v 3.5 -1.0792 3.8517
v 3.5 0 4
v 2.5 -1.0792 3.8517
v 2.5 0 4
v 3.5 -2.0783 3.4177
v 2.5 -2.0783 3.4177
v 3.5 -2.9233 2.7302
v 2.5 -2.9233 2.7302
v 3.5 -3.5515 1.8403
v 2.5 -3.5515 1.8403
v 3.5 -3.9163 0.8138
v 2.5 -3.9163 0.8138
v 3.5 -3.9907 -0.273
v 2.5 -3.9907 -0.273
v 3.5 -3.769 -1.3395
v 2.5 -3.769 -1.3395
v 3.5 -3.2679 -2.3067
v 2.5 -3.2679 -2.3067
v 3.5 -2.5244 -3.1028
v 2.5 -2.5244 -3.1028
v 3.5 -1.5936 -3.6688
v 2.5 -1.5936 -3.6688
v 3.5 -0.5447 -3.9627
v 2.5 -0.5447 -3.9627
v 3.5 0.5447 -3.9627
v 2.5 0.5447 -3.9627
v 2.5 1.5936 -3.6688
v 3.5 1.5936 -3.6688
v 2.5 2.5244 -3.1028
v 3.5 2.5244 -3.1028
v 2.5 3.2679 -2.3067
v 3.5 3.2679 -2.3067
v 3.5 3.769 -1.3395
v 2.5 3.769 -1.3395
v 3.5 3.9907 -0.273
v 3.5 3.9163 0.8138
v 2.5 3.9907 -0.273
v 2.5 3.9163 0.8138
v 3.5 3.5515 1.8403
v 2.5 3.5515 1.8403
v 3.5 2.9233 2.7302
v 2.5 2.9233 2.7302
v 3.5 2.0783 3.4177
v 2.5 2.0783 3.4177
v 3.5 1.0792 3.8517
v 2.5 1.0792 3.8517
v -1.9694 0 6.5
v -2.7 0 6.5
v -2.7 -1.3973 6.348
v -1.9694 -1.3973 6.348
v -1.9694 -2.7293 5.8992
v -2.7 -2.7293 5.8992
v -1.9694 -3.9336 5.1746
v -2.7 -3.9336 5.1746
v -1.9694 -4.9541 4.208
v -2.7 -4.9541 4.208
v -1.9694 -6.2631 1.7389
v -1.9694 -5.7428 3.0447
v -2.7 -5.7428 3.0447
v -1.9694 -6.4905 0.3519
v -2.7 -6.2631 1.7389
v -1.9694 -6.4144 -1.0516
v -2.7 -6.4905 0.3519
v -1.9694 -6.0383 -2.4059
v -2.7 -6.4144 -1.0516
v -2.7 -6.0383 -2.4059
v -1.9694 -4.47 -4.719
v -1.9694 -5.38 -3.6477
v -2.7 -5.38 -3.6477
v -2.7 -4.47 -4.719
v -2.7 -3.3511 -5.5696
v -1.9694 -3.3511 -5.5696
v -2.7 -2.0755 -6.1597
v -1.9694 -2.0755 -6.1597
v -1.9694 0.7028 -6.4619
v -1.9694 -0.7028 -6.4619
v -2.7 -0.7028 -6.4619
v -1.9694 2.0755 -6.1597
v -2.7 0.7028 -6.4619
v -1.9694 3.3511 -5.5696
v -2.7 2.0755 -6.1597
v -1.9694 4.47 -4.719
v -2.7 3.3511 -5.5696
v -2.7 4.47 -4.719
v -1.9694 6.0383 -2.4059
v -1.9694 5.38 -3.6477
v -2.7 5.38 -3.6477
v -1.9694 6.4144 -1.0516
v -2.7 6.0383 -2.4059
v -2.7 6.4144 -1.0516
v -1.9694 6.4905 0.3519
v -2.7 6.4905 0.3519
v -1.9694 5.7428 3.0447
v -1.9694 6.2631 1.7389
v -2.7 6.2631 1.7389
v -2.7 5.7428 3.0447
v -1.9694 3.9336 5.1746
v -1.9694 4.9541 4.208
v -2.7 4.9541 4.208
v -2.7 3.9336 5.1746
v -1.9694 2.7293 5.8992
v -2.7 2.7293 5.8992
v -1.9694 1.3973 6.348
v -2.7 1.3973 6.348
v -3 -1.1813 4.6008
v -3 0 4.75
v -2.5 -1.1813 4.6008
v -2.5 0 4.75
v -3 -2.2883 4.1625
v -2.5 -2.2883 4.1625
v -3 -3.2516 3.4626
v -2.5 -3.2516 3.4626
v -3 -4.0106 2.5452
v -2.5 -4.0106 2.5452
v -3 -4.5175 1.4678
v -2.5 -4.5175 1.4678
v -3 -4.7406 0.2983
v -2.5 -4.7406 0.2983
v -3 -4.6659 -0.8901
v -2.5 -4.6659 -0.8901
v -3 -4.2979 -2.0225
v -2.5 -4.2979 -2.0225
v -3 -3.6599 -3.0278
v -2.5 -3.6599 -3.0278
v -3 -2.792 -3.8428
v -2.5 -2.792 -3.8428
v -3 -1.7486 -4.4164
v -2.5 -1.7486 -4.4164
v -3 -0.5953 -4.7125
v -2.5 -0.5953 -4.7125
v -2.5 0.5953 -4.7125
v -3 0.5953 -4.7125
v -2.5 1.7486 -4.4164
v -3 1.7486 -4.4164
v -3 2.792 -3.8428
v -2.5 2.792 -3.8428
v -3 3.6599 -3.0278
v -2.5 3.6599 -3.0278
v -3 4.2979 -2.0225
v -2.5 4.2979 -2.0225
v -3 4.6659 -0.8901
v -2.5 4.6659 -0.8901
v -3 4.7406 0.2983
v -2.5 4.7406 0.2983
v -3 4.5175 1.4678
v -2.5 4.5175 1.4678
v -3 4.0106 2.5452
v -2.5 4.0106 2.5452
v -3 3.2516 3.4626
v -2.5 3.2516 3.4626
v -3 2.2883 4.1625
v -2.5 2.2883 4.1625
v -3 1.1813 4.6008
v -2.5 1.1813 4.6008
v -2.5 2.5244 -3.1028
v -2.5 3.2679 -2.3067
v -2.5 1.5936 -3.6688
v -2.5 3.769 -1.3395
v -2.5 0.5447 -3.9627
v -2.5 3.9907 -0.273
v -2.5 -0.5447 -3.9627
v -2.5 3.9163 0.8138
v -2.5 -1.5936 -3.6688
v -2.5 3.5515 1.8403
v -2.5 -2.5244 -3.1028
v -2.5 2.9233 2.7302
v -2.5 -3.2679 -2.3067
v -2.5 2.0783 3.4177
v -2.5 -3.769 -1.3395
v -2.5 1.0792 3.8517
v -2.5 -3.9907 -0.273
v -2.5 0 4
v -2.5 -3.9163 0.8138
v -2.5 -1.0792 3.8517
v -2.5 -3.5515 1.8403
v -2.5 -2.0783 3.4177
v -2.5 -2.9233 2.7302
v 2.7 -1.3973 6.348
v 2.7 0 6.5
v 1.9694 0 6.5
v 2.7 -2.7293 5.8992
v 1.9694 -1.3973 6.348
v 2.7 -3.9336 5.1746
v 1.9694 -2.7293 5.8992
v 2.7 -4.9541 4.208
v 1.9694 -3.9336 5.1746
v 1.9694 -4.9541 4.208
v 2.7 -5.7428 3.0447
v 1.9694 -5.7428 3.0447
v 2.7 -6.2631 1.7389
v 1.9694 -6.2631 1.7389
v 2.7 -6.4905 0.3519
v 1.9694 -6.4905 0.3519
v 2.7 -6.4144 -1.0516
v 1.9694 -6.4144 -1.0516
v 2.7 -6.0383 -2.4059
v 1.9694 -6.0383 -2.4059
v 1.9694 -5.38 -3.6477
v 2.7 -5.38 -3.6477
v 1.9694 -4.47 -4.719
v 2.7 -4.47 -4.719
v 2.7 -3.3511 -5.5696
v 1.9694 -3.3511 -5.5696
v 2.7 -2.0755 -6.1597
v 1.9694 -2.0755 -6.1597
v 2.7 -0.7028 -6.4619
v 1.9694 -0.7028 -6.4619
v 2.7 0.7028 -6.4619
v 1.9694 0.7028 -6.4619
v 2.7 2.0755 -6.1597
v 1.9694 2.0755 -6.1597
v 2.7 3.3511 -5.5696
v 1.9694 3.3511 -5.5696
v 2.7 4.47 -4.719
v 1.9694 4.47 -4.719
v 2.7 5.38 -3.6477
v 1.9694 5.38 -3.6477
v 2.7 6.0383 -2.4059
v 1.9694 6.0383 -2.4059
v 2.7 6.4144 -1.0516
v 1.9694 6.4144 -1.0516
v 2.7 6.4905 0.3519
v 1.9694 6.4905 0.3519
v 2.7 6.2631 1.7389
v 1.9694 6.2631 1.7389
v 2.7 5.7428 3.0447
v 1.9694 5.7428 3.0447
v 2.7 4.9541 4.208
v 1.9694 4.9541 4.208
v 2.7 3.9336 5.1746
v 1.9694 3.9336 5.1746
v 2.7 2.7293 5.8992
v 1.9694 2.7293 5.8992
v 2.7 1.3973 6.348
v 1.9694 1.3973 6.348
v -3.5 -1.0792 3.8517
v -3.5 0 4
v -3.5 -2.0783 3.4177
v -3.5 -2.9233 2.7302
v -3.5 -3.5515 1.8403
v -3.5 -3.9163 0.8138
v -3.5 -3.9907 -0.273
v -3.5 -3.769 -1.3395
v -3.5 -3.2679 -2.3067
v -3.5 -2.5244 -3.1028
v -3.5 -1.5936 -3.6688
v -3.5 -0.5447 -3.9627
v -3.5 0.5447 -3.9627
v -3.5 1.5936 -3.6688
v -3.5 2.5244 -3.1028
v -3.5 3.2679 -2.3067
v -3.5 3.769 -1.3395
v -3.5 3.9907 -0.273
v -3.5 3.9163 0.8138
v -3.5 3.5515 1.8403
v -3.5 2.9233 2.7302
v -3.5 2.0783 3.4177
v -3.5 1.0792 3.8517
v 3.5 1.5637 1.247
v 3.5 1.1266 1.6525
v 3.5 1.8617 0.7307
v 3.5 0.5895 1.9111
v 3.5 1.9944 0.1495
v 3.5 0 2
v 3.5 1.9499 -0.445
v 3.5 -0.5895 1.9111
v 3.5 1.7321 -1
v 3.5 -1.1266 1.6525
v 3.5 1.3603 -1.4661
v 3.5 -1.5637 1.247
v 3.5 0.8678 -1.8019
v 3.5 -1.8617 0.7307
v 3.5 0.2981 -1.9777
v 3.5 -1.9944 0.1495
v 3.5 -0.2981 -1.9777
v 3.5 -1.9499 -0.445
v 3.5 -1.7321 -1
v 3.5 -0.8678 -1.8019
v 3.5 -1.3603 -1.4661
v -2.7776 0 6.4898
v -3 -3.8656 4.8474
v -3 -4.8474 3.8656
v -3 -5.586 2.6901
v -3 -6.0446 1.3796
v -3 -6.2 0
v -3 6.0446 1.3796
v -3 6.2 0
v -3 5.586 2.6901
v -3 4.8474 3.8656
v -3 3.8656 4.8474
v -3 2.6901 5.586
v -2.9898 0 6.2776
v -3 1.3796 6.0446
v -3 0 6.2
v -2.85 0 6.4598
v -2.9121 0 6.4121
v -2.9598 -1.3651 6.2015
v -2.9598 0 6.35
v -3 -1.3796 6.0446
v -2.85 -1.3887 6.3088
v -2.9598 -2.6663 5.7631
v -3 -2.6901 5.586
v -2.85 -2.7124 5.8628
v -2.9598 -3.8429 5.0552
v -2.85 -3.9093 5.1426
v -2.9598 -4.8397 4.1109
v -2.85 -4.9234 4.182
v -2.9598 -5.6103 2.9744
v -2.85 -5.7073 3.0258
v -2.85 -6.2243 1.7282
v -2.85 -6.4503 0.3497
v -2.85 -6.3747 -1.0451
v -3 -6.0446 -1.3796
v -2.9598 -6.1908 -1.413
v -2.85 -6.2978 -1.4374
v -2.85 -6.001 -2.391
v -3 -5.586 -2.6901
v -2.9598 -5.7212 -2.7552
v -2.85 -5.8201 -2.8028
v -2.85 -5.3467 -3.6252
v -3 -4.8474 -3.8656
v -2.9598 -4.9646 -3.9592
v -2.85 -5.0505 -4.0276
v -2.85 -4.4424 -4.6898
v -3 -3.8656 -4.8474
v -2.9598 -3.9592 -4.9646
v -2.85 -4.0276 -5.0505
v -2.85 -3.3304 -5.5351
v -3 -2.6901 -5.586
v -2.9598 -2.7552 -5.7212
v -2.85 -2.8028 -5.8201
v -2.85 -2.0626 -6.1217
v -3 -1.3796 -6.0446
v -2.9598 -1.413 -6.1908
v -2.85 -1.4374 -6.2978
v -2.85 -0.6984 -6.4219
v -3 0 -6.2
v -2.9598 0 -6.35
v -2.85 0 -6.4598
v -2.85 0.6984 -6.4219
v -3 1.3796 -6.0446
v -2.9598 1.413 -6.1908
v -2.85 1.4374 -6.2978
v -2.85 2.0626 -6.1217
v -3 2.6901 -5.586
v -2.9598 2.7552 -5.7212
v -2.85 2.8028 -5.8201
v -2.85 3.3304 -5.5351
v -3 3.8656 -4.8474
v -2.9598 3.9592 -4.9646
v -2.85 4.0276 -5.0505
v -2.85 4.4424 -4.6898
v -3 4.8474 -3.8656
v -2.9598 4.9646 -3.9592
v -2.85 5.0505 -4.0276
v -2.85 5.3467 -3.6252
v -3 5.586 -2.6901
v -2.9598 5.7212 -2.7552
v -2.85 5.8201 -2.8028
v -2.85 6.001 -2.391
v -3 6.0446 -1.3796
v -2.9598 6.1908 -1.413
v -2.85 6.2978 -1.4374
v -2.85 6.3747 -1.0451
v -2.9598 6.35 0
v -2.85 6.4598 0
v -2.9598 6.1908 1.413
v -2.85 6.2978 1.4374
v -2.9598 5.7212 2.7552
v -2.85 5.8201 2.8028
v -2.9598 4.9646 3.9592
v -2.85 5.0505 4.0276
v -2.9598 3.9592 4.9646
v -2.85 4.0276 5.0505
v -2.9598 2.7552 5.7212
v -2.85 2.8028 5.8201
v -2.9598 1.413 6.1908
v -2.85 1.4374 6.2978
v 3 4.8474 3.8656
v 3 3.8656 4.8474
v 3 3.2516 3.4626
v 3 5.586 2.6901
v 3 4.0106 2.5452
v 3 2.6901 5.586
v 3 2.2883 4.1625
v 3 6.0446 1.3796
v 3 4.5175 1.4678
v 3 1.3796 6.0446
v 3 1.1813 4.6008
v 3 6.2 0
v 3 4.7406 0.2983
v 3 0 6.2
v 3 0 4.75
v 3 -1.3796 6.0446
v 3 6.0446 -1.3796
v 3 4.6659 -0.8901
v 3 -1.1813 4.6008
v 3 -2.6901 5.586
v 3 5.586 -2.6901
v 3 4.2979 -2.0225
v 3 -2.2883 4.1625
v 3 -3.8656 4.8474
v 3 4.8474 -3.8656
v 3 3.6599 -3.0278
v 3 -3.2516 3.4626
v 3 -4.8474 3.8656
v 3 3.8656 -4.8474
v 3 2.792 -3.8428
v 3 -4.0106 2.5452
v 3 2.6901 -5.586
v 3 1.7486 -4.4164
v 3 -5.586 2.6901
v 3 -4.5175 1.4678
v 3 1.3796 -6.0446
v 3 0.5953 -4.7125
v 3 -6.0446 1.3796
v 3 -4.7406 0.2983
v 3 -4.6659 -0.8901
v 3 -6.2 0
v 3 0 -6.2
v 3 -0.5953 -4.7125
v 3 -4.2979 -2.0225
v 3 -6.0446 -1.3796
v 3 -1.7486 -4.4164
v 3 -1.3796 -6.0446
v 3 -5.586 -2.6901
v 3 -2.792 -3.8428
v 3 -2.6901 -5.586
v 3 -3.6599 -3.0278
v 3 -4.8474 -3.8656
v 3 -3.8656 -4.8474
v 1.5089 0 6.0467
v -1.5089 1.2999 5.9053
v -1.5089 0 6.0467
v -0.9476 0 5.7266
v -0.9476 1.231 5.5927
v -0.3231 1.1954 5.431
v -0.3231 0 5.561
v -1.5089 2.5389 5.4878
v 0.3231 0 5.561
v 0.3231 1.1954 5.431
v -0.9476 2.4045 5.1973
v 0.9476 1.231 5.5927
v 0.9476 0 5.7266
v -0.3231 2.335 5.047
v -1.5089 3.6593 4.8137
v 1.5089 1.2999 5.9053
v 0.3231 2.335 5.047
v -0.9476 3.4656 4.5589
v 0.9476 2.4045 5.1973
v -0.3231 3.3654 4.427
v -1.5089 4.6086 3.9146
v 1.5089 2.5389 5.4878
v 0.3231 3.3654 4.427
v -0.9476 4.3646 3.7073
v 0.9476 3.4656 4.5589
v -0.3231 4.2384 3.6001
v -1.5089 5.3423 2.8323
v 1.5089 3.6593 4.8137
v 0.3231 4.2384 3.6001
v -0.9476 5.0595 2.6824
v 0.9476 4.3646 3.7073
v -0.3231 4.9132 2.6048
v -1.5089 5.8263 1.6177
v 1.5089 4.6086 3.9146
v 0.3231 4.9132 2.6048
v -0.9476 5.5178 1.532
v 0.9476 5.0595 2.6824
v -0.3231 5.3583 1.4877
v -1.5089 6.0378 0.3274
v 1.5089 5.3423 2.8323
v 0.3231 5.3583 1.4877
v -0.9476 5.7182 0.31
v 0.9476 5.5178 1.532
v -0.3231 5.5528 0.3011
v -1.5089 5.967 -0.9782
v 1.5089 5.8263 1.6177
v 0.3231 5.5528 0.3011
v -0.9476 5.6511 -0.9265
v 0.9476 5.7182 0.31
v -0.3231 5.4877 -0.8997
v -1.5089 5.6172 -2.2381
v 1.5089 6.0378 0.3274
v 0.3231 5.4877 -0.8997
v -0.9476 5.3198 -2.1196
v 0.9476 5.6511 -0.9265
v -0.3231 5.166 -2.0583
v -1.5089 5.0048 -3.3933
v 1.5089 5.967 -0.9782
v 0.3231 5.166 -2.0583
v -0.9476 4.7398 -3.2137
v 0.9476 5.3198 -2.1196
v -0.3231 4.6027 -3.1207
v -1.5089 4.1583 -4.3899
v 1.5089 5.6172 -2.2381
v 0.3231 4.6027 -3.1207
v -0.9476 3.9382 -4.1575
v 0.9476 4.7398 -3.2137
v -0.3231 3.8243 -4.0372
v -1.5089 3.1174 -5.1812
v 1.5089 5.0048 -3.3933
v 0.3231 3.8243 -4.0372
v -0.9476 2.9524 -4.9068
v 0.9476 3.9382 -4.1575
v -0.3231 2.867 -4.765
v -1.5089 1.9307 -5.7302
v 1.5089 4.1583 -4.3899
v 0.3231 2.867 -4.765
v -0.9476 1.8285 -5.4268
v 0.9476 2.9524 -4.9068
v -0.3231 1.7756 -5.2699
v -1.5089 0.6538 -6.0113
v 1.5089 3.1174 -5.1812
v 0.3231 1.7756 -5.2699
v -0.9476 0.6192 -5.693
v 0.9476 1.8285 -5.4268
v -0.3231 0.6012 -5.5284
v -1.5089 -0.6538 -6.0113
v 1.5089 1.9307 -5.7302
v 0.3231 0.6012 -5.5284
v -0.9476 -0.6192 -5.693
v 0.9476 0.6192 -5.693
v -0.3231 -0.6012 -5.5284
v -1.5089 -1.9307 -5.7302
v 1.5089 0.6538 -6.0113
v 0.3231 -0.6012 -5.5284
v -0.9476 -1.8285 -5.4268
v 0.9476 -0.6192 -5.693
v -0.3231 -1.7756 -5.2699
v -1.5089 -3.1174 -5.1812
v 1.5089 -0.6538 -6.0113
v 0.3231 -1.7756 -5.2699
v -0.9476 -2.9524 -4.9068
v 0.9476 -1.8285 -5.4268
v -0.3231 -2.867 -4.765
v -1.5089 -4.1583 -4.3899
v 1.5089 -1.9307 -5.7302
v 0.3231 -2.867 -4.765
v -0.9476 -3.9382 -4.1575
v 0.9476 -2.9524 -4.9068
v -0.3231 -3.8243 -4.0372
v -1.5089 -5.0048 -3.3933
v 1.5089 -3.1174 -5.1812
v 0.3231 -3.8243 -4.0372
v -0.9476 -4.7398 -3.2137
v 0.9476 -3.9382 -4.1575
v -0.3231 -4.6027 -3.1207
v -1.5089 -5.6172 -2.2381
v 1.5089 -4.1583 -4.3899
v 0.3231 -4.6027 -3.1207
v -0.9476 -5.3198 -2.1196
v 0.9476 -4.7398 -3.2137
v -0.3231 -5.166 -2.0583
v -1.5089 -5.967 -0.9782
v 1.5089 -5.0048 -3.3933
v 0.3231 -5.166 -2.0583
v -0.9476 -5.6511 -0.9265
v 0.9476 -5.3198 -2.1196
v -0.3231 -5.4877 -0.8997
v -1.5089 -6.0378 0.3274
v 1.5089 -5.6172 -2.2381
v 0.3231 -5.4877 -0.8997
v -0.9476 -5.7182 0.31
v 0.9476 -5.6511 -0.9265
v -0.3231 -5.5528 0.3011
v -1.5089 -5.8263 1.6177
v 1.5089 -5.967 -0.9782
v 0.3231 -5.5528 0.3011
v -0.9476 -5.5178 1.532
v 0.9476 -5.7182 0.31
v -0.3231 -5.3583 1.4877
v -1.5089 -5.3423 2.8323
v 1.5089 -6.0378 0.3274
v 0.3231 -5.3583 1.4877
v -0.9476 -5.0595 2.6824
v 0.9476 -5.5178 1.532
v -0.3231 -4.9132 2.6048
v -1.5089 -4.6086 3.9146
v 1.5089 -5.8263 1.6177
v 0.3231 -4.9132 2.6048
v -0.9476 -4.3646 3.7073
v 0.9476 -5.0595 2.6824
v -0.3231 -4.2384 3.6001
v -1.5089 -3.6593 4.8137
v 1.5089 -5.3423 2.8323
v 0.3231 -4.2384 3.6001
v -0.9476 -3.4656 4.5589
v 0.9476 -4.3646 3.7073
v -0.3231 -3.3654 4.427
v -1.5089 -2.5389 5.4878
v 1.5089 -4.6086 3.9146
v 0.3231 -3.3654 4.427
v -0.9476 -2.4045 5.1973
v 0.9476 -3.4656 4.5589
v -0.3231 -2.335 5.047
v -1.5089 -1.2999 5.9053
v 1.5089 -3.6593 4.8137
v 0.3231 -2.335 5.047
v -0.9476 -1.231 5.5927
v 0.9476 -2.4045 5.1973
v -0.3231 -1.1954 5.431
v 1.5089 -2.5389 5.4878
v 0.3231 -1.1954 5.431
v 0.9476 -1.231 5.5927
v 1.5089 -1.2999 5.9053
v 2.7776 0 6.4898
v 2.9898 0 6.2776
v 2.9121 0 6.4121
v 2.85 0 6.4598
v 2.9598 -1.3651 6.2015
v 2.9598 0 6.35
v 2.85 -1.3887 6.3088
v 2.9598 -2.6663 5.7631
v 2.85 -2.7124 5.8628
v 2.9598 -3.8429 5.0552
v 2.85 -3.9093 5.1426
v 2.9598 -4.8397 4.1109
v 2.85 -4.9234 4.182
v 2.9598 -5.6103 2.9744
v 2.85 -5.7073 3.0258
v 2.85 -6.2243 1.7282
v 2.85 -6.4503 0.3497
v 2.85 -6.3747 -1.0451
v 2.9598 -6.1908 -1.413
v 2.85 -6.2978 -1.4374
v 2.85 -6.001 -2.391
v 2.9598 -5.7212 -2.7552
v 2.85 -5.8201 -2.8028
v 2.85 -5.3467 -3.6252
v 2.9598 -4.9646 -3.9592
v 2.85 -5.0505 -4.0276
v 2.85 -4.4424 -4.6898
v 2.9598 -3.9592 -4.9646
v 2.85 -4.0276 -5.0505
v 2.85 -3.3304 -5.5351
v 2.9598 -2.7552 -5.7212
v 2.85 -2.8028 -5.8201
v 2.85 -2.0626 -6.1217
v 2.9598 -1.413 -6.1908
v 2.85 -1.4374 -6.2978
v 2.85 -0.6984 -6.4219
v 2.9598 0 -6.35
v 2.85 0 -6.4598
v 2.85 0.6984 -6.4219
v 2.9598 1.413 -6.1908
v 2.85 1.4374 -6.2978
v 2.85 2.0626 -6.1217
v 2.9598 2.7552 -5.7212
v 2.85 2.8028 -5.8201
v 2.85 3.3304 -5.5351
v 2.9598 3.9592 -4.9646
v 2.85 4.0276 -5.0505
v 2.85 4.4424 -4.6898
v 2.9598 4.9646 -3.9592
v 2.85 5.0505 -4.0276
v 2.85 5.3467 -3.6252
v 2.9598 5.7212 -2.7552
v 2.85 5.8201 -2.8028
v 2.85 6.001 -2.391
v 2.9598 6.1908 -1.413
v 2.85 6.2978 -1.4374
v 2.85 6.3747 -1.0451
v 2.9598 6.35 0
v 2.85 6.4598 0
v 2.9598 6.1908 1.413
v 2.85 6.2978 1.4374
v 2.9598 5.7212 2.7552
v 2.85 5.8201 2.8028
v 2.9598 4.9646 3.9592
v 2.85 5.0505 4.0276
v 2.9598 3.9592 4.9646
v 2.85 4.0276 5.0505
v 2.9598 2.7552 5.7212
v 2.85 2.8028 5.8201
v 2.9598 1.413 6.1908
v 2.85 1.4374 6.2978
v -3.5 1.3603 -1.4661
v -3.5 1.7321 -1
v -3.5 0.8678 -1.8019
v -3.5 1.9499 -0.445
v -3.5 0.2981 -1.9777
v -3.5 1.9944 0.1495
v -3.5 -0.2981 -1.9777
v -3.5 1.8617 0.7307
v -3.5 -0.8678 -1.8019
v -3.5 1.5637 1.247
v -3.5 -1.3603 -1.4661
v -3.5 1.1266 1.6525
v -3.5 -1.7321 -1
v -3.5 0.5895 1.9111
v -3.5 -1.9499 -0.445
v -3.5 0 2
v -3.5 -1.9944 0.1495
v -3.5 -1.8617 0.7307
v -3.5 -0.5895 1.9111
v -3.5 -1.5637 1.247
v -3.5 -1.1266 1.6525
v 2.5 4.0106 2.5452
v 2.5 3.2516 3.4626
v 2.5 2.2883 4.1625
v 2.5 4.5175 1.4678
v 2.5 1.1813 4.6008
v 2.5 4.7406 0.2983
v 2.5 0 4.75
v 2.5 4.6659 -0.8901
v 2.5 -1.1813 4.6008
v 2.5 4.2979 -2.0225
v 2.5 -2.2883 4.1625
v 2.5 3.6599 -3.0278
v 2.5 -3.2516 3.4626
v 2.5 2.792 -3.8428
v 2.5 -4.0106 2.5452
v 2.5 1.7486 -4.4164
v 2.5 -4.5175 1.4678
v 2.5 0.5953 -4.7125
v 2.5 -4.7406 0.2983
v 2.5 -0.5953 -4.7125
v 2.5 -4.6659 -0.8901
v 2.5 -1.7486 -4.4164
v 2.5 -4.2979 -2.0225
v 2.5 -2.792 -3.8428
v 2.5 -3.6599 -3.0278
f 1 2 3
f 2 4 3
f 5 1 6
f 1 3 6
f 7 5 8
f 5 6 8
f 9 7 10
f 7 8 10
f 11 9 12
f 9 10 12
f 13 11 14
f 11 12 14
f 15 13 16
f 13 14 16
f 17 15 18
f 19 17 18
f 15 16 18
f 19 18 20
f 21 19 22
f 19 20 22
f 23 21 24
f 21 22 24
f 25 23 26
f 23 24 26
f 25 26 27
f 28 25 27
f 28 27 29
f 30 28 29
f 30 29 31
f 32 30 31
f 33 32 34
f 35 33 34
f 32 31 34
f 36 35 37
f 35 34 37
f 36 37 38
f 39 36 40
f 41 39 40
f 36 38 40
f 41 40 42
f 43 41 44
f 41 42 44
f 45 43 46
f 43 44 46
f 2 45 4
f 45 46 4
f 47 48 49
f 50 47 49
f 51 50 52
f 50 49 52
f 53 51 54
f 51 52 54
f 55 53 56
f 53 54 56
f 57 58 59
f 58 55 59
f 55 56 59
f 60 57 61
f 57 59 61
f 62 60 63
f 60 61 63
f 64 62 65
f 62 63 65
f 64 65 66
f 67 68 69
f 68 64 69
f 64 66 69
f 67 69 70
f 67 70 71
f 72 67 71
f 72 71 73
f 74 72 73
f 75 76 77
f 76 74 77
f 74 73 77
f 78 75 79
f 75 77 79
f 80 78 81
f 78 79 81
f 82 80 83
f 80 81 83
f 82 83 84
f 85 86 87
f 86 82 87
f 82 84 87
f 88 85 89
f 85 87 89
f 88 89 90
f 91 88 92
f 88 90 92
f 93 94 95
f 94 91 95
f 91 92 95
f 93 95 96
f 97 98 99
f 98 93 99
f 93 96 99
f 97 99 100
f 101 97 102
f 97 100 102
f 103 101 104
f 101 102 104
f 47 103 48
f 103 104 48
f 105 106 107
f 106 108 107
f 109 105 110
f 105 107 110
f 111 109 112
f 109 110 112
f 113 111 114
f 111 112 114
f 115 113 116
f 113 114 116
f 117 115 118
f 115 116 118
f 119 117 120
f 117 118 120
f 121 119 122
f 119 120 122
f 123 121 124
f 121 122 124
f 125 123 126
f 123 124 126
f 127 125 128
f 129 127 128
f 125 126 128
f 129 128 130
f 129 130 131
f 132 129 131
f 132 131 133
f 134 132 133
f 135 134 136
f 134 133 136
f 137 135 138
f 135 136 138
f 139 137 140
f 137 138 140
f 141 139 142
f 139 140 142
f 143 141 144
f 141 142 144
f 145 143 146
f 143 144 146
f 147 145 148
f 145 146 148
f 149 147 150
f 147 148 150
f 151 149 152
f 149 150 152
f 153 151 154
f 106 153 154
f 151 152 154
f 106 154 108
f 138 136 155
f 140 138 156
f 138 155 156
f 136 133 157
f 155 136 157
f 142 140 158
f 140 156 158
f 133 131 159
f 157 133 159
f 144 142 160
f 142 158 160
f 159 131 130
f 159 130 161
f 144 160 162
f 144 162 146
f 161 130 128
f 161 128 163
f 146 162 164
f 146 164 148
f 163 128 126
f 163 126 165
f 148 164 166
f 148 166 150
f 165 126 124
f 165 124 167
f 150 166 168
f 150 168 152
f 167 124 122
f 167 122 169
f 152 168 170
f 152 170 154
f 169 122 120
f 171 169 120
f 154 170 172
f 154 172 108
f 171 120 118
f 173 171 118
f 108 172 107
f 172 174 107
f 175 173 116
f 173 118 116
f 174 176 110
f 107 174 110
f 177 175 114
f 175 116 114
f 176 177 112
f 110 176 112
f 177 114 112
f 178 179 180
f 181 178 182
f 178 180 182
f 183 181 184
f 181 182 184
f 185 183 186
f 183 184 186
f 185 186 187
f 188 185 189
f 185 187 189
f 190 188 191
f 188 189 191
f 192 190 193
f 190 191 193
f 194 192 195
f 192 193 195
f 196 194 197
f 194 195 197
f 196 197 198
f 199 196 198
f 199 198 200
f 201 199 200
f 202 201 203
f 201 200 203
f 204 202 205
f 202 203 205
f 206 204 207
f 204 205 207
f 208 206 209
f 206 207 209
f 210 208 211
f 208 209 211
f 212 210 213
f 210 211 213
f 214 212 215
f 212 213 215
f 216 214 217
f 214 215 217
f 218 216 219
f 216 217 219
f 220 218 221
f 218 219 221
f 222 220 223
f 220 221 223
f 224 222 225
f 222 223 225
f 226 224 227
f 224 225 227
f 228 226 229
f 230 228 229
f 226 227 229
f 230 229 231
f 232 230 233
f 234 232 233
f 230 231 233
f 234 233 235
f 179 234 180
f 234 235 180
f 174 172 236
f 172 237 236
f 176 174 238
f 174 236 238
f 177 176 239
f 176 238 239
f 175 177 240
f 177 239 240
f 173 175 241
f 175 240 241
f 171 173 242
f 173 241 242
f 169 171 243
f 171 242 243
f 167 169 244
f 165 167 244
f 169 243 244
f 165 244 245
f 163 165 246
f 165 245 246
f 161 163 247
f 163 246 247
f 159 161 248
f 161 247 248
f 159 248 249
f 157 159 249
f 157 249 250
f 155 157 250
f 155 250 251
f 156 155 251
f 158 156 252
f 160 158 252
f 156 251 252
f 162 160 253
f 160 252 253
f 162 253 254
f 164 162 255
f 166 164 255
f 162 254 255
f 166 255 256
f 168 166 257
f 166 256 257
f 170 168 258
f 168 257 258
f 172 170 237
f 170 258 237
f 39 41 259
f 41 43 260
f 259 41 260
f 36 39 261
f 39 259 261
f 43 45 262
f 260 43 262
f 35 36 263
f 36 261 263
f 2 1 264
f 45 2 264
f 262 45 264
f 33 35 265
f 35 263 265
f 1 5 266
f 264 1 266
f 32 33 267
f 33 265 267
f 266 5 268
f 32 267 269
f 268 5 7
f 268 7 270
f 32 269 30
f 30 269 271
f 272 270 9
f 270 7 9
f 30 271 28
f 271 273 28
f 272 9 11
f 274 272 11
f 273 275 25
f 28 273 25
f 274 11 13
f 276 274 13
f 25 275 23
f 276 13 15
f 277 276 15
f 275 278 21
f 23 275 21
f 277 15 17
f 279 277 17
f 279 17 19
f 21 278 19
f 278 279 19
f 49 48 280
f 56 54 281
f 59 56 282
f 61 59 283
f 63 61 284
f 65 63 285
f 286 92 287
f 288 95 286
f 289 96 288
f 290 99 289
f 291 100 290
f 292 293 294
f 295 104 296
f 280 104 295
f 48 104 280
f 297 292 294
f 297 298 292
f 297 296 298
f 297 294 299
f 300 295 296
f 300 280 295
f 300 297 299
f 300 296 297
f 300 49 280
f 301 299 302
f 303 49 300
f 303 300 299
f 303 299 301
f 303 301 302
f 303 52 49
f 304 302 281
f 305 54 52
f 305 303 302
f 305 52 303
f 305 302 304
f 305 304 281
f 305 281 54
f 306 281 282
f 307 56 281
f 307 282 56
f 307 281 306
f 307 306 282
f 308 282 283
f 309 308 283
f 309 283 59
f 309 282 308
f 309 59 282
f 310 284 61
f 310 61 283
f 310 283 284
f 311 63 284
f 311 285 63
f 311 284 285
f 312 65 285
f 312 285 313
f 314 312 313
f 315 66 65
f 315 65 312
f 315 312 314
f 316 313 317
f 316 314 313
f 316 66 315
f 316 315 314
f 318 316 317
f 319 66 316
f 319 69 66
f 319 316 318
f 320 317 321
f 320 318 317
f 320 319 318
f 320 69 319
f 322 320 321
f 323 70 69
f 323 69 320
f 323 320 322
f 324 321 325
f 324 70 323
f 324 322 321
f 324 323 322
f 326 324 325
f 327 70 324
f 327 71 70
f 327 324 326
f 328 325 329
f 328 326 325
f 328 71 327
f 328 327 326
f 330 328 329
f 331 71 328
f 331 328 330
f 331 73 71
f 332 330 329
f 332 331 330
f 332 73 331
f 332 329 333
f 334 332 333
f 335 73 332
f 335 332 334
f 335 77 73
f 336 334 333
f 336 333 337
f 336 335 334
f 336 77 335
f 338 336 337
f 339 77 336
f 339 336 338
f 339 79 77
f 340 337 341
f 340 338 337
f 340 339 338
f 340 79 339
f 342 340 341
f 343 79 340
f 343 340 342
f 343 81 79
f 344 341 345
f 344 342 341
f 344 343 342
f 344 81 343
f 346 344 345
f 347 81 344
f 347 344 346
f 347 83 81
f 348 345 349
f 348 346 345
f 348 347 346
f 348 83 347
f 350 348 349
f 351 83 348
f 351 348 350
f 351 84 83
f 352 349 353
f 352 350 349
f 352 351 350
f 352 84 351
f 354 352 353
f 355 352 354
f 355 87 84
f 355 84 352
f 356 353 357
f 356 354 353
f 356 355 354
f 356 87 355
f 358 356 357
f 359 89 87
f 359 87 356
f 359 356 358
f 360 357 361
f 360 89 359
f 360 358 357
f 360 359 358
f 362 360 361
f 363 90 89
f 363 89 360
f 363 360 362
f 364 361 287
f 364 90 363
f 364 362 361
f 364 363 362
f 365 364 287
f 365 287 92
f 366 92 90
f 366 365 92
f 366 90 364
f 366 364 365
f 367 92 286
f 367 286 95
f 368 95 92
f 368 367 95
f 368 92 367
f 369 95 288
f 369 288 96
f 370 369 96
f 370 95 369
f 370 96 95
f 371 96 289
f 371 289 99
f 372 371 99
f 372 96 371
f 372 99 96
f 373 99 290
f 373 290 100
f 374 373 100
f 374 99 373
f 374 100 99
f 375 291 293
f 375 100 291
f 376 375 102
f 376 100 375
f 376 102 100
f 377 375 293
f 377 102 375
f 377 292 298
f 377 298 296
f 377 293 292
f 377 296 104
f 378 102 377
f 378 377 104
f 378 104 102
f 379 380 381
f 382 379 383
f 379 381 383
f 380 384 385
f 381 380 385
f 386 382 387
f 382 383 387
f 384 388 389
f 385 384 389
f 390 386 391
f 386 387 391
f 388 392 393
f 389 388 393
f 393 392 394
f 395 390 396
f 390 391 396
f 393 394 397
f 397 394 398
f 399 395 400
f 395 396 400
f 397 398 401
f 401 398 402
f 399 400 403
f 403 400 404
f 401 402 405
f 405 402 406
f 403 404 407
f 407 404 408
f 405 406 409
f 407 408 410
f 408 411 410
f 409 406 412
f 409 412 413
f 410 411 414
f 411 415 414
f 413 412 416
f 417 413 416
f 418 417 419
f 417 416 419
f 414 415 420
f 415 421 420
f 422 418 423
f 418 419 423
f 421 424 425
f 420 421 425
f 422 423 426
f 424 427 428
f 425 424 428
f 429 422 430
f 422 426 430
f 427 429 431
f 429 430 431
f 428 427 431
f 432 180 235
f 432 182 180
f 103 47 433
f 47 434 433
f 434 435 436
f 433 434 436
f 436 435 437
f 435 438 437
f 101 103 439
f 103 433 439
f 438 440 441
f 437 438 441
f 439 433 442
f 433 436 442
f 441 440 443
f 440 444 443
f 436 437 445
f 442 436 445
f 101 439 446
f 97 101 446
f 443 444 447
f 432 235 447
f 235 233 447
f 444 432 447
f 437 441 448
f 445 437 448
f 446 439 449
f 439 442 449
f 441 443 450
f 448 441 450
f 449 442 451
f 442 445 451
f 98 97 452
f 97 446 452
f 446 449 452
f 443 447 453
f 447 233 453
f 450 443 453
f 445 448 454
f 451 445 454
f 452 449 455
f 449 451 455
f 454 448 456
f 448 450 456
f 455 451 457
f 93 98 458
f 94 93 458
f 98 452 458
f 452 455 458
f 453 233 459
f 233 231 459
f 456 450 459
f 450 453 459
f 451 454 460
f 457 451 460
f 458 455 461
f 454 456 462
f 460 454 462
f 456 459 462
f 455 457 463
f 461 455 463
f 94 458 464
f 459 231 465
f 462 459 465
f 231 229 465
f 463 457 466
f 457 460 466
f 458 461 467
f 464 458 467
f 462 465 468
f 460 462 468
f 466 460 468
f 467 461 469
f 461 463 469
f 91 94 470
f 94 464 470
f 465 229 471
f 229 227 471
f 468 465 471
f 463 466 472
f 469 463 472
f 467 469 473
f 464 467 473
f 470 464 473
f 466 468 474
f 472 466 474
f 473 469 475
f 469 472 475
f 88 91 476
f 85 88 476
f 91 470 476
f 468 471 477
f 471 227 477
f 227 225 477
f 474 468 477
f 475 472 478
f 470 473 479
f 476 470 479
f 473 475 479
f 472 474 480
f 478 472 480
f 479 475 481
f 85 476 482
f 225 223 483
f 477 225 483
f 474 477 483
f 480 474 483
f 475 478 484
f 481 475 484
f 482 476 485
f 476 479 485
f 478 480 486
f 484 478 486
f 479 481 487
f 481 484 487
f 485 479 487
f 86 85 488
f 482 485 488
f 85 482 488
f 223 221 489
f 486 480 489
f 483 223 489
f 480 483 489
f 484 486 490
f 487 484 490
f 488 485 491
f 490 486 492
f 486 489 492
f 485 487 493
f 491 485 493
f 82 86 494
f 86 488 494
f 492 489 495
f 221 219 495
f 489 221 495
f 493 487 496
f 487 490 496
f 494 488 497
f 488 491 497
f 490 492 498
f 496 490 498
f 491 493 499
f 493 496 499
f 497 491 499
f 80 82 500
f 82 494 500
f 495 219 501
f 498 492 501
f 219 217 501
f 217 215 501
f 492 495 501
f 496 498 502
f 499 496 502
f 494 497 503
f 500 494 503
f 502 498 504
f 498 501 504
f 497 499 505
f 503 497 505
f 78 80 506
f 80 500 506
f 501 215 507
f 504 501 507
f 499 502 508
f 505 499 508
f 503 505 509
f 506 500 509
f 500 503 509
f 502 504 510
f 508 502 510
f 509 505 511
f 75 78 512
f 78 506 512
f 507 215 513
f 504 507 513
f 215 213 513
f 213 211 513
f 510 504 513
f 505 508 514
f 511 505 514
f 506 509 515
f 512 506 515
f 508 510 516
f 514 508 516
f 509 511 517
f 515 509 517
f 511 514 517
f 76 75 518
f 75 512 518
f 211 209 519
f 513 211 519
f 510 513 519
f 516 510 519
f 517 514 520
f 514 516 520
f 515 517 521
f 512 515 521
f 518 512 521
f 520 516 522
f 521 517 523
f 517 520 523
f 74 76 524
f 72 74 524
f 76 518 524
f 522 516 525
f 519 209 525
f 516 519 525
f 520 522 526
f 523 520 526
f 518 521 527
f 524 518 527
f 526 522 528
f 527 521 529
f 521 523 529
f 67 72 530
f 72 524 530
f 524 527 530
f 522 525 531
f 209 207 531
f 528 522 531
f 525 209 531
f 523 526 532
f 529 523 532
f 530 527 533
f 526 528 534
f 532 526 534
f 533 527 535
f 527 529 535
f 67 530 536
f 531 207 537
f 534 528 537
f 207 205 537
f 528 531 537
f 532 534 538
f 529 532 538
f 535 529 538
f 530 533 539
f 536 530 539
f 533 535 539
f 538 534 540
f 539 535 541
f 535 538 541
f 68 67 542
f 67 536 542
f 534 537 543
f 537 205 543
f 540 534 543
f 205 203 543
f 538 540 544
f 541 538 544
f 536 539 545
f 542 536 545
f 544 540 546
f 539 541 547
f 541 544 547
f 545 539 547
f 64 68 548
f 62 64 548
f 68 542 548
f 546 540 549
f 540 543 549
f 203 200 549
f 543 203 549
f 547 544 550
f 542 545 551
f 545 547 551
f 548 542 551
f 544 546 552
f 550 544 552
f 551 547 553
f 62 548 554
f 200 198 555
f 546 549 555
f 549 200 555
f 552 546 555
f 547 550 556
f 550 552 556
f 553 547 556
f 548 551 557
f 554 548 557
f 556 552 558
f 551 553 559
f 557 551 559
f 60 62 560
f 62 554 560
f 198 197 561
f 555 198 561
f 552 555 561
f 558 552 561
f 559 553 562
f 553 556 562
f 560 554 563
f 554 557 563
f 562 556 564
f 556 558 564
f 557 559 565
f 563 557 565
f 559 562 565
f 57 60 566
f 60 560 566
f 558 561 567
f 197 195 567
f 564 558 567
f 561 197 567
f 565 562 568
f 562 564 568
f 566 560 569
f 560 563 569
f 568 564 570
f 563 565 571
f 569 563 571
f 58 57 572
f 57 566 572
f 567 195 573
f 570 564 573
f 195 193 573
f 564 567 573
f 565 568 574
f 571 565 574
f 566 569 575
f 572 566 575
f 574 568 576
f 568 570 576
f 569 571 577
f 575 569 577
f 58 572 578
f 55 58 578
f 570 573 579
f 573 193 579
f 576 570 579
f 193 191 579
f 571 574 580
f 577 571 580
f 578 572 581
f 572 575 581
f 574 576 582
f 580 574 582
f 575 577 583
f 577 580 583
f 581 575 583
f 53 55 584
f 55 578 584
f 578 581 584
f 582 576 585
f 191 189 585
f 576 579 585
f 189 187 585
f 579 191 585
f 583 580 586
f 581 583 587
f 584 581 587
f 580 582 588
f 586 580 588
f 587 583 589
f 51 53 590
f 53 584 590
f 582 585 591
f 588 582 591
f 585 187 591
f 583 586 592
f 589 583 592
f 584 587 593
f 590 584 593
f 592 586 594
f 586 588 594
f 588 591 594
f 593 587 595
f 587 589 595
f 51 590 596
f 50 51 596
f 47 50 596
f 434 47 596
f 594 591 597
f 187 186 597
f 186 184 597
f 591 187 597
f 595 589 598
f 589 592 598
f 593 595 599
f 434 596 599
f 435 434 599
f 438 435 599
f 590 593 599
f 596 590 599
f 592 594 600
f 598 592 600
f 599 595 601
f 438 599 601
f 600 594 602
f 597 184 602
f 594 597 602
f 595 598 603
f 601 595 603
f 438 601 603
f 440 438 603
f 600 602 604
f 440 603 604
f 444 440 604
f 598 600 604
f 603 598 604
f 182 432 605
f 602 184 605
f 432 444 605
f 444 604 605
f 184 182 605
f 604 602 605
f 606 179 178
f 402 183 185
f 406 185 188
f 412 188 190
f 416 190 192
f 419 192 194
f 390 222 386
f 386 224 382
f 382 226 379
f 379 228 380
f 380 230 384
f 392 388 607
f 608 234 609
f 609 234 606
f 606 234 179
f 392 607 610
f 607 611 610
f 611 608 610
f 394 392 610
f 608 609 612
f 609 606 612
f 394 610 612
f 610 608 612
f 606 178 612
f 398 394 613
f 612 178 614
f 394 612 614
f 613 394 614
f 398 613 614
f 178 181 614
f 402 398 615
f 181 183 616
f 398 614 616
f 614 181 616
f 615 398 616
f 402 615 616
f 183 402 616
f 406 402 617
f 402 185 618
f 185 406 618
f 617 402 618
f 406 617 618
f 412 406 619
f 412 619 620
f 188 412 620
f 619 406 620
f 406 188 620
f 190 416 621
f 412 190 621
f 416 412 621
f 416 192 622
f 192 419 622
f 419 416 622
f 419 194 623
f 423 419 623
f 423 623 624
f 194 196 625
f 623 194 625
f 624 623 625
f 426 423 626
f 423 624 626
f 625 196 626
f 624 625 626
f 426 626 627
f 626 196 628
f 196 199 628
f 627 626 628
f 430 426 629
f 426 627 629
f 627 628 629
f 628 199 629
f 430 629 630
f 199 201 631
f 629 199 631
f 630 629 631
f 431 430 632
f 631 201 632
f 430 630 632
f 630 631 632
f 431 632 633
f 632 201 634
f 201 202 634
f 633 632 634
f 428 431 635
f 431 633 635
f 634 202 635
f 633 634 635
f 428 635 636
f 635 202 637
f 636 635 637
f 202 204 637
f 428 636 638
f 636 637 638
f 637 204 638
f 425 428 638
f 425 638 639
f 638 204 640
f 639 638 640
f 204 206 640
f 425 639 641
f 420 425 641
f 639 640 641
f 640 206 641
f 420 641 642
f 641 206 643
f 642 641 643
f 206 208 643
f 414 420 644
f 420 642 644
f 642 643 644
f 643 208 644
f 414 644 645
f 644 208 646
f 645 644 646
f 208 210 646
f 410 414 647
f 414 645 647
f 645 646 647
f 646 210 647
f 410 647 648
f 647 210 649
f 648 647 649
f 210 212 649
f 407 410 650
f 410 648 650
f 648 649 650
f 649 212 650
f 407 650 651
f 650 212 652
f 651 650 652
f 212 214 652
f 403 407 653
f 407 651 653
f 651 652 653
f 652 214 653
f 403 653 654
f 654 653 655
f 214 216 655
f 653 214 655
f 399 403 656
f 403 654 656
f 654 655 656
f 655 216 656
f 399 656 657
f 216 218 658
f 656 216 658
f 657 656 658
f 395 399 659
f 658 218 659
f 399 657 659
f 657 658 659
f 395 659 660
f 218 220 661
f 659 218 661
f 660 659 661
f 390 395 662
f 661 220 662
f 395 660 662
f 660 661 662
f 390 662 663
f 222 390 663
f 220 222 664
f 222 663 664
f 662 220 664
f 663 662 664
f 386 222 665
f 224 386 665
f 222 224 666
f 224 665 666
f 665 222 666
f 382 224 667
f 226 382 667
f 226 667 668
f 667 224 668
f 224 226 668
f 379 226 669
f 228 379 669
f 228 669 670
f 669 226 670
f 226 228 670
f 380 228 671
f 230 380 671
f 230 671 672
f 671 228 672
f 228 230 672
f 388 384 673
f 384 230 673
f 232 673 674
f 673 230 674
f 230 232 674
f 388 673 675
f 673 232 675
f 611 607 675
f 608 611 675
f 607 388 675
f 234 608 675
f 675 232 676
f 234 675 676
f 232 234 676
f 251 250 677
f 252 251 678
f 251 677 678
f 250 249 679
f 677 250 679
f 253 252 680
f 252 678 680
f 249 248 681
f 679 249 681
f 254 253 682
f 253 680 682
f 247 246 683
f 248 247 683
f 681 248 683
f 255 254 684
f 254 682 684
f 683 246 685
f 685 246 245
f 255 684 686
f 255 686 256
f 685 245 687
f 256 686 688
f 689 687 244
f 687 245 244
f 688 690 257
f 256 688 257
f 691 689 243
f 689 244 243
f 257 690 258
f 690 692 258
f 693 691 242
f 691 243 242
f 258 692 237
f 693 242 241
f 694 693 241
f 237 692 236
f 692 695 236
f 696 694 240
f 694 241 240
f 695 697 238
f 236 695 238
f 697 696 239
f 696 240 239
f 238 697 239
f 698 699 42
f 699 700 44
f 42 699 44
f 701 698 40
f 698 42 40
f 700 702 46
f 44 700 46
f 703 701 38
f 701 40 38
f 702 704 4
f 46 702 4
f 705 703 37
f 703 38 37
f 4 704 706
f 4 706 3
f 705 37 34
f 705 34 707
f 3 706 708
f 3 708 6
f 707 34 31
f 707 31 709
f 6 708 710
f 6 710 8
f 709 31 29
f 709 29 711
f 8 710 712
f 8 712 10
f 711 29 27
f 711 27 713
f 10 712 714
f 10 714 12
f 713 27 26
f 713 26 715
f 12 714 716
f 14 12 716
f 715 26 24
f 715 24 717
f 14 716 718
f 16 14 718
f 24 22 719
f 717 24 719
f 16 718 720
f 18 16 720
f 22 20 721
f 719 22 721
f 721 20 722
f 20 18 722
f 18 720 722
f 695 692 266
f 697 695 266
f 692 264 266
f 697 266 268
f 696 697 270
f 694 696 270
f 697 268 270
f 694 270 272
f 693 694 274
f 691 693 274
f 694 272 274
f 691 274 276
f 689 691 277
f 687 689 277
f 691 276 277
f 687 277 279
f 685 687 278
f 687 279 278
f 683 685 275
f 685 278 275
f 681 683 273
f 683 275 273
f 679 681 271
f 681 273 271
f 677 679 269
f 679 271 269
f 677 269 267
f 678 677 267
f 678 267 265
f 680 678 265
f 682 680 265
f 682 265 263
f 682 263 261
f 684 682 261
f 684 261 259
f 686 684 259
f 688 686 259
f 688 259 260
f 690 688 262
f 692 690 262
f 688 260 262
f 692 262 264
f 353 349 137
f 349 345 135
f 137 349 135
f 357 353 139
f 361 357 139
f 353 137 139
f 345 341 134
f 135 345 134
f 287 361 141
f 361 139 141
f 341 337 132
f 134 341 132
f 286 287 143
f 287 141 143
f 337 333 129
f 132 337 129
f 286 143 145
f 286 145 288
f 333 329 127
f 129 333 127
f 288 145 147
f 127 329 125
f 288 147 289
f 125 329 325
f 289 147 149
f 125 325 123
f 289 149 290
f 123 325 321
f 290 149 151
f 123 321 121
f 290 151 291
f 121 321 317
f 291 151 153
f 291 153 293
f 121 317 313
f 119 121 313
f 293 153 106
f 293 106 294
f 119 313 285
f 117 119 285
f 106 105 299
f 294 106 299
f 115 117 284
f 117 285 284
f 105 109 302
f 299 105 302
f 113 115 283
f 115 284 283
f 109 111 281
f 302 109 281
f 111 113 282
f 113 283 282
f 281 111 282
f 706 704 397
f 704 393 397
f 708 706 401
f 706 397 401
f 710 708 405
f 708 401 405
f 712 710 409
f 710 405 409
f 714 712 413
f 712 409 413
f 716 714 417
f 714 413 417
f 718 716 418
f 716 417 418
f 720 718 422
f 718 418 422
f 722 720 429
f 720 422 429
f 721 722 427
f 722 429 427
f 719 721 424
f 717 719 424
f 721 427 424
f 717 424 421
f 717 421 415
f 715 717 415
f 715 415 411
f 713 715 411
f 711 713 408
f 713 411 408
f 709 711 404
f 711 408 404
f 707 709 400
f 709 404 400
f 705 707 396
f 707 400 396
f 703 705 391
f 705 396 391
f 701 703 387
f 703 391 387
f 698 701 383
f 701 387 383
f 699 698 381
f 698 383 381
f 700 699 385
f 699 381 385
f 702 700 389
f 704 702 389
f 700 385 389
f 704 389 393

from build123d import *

# Parameters (mm, degrees)
SKETCH_2_R = 2.5
FILLET_1_R = 0.3


with BuildPart() as part:
    # 草图1 → 旋转1 (revolve)
    with BuildSketch(Plane(origin=(0, 0, 0), x_dir=(1, 0, 0), z_dir=(0, 1, 0)), mode=Mode.PRIVATE) as revolve_1_sk:
        Polygon((-3.5, 2), (3.5, 2), (3.5, 4), (2.5, 4), (2.5, 4.75), (3, 4.75), (3, 6.5), (-3, 6.5), (-3, 4.75), (-2.5, 4.75), (-2.5, 4), (-3.5, 4), align=None)
    revolve(revolve_1_sk.sketch.rotate(Axis((0, 0, 0), (1, 0, 0)), 180), axis=Axis((0, 0, 0), (1, 0, 0)))

    # 草图2 → 切除-旋转1 (revolve, cut)
    with BuildSketch(Plane(origin=(0, 0, 0), x_dir=(1, 0, 0), z_dir=(0, 1, 0)), mode=Mode.PRIVATE) as cut_revolve_1_sk:
        with Locations((0, 8.04)):
            Circle(SKETCH_2_R)
    revolve(cut_revolve_1_sk.sketch.rotate(Axis((0, 0, 0), (-1, 0, 0)), 180), axis=Axis((0, 0, 0), (-1, 0, 0)), mode=Mode.SUBTRACT)

    # 圆角1
    fillet_1_edges = [part.edges().sort_by_distance(p)[0] for p in [
        (3, 0, -6.5),
        (-3, 0, -6.5),
    ]]
    fillet(fillet_1_edges, radius=FILLET_1_R)


solid = part.part
